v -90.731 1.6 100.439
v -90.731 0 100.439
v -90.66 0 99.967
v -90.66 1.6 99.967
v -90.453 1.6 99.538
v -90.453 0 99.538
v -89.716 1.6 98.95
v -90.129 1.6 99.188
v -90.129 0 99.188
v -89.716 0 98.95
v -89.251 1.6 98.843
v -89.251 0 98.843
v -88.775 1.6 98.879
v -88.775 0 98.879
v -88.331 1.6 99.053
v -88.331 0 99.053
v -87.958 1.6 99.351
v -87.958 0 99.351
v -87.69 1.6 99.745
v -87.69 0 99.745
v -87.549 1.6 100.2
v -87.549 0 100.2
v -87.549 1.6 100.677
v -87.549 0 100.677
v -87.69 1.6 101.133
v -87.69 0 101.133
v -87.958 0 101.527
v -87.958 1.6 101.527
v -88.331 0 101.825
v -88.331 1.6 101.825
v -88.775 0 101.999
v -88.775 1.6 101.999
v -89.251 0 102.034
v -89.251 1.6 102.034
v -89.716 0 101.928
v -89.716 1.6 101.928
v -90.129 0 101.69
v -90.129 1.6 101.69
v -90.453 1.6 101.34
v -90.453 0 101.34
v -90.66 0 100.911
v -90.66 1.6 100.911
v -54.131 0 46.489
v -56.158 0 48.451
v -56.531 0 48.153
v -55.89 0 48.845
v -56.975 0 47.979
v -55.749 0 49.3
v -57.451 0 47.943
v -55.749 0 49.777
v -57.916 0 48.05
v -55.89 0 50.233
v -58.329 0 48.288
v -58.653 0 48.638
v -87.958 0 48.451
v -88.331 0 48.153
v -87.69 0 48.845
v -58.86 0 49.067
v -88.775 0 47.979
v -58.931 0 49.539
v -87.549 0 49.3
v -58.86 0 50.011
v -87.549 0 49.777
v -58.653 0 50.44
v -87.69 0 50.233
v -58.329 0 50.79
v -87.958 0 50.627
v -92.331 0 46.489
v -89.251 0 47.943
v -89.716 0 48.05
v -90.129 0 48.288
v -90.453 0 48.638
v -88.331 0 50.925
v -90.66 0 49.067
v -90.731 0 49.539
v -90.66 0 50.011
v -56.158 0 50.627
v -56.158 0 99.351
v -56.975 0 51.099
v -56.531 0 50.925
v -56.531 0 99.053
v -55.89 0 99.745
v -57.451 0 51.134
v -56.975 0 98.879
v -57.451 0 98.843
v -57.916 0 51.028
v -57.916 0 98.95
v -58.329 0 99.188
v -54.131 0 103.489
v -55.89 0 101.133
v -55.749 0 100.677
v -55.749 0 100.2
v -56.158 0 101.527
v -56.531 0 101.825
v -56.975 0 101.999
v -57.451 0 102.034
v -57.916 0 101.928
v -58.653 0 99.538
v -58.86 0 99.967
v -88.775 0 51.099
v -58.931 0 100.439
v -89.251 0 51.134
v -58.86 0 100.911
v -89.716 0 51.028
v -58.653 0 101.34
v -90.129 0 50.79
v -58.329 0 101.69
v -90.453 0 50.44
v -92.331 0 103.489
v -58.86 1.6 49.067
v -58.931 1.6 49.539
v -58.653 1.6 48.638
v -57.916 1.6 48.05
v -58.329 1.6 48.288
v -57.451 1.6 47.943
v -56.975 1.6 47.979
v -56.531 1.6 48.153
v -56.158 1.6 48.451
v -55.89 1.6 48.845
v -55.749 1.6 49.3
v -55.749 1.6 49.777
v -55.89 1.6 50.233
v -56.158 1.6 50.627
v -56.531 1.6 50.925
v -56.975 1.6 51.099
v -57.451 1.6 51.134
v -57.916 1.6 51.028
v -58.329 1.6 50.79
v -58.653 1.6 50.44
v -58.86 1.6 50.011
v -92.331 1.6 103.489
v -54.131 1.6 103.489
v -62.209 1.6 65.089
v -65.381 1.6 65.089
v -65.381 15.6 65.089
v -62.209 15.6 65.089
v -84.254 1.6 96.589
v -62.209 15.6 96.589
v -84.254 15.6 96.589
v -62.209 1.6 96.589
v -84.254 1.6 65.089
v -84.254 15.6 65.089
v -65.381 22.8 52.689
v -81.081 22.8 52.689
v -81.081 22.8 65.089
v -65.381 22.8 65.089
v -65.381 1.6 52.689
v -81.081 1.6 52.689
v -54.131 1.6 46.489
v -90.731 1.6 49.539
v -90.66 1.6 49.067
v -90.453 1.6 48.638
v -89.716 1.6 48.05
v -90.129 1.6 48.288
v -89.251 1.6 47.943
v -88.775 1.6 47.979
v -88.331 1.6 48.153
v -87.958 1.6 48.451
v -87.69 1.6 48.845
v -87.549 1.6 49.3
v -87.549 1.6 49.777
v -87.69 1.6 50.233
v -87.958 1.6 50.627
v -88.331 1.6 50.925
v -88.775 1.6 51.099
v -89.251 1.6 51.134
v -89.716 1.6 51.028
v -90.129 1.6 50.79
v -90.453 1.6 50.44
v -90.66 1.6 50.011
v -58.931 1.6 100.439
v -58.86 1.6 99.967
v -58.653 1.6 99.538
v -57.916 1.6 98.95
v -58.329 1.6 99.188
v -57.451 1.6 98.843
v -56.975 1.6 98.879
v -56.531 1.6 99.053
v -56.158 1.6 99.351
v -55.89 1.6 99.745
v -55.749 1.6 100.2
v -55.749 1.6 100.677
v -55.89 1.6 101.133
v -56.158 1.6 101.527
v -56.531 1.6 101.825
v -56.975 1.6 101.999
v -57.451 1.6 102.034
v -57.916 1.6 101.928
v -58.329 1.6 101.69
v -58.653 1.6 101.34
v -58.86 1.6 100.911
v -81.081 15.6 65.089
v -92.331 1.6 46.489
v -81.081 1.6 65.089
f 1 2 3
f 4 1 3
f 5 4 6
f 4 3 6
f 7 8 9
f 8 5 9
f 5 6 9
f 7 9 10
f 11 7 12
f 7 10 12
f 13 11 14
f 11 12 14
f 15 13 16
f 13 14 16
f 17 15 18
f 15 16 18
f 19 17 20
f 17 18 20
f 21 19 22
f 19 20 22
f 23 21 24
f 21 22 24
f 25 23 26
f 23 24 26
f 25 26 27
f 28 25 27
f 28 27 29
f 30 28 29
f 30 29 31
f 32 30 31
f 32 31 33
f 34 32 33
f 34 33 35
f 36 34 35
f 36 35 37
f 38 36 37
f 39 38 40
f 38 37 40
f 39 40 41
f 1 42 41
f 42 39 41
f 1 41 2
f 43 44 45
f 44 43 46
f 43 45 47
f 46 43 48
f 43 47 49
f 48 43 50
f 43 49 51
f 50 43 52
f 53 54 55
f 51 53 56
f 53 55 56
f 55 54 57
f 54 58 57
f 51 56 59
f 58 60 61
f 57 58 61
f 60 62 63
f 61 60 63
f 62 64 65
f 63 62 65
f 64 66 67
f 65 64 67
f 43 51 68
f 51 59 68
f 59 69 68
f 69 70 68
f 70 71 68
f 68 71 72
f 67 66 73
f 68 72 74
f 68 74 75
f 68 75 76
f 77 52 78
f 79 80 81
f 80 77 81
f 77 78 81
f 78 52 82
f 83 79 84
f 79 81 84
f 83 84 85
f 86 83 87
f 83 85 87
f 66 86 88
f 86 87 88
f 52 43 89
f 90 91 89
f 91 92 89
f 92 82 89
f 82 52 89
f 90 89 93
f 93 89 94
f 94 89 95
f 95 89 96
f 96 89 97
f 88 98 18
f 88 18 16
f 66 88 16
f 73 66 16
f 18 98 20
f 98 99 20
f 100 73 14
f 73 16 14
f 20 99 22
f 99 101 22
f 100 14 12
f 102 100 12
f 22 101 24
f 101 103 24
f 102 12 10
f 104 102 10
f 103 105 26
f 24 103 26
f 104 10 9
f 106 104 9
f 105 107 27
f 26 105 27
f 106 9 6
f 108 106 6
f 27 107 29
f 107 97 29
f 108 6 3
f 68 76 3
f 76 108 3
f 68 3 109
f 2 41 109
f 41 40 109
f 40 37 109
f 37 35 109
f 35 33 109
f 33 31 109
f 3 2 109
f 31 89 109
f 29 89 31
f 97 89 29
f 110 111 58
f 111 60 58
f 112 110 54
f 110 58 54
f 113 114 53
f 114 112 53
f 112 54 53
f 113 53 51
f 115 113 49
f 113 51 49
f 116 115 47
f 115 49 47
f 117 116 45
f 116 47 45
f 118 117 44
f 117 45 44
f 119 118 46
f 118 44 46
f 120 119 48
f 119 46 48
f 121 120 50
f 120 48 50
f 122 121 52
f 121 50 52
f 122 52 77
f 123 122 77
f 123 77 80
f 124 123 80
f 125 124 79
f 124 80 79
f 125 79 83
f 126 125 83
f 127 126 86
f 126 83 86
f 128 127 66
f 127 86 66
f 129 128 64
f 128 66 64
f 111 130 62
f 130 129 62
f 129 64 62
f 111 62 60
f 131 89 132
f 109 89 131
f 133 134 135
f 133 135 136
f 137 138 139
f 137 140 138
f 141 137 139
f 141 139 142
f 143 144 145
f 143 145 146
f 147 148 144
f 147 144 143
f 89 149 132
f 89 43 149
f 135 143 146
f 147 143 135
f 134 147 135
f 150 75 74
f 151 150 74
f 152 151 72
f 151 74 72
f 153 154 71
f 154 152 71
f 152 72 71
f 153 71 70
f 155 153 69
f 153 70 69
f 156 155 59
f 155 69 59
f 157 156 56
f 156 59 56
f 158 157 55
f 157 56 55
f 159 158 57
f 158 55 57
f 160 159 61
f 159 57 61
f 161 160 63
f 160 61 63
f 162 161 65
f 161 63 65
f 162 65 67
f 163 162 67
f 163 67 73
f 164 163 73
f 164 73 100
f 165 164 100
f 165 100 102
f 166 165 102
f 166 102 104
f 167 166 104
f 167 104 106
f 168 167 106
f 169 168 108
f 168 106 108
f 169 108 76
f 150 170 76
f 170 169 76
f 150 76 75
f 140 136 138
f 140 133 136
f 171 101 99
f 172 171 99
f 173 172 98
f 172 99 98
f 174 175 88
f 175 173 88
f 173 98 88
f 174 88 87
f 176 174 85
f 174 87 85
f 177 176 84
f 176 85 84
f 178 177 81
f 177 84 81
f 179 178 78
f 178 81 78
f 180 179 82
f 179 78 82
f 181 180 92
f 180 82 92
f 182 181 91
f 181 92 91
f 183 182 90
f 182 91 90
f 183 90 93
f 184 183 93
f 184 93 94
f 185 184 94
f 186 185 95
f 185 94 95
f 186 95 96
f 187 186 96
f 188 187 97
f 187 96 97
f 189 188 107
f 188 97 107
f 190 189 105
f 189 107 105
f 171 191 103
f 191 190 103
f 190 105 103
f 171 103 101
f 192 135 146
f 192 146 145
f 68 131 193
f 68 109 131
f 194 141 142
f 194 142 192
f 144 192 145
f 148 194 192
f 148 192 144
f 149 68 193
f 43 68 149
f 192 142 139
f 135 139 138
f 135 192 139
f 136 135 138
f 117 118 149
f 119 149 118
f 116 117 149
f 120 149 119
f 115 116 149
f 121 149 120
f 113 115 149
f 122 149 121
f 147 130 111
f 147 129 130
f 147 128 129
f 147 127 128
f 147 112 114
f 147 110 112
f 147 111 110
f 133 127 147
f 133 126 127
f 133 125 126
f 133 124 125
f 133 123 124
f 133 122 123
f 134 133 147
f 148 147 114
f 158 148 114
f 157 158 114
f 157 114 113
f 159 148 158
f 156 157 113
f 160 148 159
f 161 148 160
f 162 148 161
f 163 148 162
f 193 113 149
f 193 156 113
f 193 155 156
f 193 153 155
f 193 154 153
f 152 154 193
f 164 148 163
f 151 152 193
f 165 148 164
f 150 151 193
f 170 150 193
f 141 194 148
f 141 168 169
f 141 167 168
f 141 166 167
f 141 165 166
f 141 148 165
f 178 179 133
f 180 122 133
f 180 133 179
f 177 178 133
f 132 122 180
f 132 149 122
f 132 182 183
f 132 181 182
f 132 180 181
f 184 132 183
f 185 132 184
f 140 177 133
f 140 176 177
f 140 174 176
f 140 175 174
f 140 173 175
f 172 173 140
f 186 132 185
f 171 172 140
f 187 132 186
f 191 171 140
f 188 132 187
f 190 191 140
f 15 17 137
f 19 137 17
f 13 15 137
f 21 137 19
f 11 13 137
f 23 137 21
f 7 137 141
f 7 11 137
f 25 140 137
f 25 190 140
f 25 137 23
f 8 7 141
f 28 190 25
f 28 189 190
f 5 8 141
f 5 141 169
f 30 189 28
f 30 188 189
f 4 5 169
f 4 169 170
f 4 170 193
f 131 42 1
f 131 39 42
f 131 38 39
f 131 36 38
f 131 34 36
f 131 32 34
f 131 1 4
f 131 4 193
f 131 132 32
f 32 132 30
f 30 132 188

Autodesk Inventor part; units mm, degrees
ref_plane "YZ Plane" through (0, 0, 0) normal (1, 0, 0) x (0, 1, 0)
ref_plane "XZ Plane" through (0, 0, 0) normal (0, 1, 0) x (-1, 0, 0)
ref_plane "XY Plane" through (0, 0, 0) normal (0, 0, 1) x (1, 0, 0)
sketch "Sketch1" plane through (0, 0, 0) normal (0, 1, 0) x (-1, 0, 0)
  line L0 (92.3312, 46.4889) -> (54.1312, 46.4889)
  line L1 (54.1312, 46.4889) -> (54.1312, 103.4889)
  line L2 (54.1312, 103.4889) -> (92.3312, 103.4889)
  line L3 (92.3312, 103.4889) -> (92.3312, 46.4889)
  circle A0 centre (89.1312, 49.5389) radius 1.6
  circle A1 centre (57.3312, 49.5389) radius 1.6
  circle A2 centre (89.1312, 100.4389) radius 1.6
  circle A3 centre (57.3312, 100.4389) radius 1.6
  point P0 (0, 0)
  dimension "d0" = 57
  dimension "d1" = 38.2
  dimension "d2" = 3.2
  dimension "d3" = 3.2
  dimension "d4" = 3.05
  dimension "d11" = 3.05
  dimension "d12" = 3.2
  dimension "d13" = 3.05
  dimension "d14" = 3.05
  dimension "d15" = 3.2
  dimension "d16" = 3.2
extrude "Extrusion1" add sketch "Sketch1" along normal blind 1.6
sketch "Sketch2" plane through (0, 1.6, 0) normal (0, 1, 0) x (1, 0, 0)
  line L0 (-81.0812, -52.6889) -> (-65.3812, -52.6889)
  line L1 (-65.3812, -52.6889) -> (-65.3812, -65.0889)
  line L2 (-65.3812, -65.0889) -> (-81.0812, -65.0889)
  line L3 (-81.0812, -65.0889) -> (-81.0812, -52.6889)
  line L4 (-54.1312, -46.4889) -> (-92.3312, -46.4889) projected
  line L5 (-92.3312, -46.4889) -> (-92.3312, -103.4889) construction
  line L6 (-54.1312, -46.4889) -> (-92.3312, -103.4889) construction
  line L7 (-92.3312, -103.4889) -> (-54.1312, -103.4889) construction
  line L8 (-92.3312, -46.4889) -> (-54.1312, -103.4889) construction
  line L9 (-73.2312, -103.4889) -> (-73.2312, -46.4889) construction
  point P0 (0, 0)
  point P1 (-73.2312, -52.6889)
  dimension "d19" = 6.2
  dimension "d20" = 15.7
  dimension "d21" = 12.4
extrude "Extrusion2" add sketch "Sketch2" along normal blind 21.2
sketch "Sketch3" plane through (0, 1.6, 0) normal (0, 1, 0) x (1, 0, 0)
  line L0 (-81.0812, -65.0889) -> (-65.3812, -65.0889) projected
  line L1 (-84.2537, -65.0889) -> (-62.2087, -65.0889)
  line L2 (-62.2087, -65.0889) -> (-62.2087, -96.5889)
  line L3 (-62.2087, -96.5889) -> (-84.2537, -96.5889)
  line L4 (-84.2537, -96.5889) -> (-84.2537, -65.0889)
  line L5 (-92.3312, -103.4889) -> (-54.1312, -103.4889) projected
  line L6 (-54.1312, -103.4889) -> (-54.1312, -46.4889) construction
  line L7 (-54.1312, -103.4889) -> (-92.3312, -46.4889) construction
  line L8 (-92.3312, -103.4889) -> (-54.1312, -46.4889) construction
  line L9 (-73.2312, -61.8477) -> (-73.2312, -121.9284) construction
  point P0 (0, 0)
  dimension "d24" = 6.9
extrude "Extrusion3" add sketch "Sketch3" along normal blind 14
properties part number "NAS_Splitter_PCB"
